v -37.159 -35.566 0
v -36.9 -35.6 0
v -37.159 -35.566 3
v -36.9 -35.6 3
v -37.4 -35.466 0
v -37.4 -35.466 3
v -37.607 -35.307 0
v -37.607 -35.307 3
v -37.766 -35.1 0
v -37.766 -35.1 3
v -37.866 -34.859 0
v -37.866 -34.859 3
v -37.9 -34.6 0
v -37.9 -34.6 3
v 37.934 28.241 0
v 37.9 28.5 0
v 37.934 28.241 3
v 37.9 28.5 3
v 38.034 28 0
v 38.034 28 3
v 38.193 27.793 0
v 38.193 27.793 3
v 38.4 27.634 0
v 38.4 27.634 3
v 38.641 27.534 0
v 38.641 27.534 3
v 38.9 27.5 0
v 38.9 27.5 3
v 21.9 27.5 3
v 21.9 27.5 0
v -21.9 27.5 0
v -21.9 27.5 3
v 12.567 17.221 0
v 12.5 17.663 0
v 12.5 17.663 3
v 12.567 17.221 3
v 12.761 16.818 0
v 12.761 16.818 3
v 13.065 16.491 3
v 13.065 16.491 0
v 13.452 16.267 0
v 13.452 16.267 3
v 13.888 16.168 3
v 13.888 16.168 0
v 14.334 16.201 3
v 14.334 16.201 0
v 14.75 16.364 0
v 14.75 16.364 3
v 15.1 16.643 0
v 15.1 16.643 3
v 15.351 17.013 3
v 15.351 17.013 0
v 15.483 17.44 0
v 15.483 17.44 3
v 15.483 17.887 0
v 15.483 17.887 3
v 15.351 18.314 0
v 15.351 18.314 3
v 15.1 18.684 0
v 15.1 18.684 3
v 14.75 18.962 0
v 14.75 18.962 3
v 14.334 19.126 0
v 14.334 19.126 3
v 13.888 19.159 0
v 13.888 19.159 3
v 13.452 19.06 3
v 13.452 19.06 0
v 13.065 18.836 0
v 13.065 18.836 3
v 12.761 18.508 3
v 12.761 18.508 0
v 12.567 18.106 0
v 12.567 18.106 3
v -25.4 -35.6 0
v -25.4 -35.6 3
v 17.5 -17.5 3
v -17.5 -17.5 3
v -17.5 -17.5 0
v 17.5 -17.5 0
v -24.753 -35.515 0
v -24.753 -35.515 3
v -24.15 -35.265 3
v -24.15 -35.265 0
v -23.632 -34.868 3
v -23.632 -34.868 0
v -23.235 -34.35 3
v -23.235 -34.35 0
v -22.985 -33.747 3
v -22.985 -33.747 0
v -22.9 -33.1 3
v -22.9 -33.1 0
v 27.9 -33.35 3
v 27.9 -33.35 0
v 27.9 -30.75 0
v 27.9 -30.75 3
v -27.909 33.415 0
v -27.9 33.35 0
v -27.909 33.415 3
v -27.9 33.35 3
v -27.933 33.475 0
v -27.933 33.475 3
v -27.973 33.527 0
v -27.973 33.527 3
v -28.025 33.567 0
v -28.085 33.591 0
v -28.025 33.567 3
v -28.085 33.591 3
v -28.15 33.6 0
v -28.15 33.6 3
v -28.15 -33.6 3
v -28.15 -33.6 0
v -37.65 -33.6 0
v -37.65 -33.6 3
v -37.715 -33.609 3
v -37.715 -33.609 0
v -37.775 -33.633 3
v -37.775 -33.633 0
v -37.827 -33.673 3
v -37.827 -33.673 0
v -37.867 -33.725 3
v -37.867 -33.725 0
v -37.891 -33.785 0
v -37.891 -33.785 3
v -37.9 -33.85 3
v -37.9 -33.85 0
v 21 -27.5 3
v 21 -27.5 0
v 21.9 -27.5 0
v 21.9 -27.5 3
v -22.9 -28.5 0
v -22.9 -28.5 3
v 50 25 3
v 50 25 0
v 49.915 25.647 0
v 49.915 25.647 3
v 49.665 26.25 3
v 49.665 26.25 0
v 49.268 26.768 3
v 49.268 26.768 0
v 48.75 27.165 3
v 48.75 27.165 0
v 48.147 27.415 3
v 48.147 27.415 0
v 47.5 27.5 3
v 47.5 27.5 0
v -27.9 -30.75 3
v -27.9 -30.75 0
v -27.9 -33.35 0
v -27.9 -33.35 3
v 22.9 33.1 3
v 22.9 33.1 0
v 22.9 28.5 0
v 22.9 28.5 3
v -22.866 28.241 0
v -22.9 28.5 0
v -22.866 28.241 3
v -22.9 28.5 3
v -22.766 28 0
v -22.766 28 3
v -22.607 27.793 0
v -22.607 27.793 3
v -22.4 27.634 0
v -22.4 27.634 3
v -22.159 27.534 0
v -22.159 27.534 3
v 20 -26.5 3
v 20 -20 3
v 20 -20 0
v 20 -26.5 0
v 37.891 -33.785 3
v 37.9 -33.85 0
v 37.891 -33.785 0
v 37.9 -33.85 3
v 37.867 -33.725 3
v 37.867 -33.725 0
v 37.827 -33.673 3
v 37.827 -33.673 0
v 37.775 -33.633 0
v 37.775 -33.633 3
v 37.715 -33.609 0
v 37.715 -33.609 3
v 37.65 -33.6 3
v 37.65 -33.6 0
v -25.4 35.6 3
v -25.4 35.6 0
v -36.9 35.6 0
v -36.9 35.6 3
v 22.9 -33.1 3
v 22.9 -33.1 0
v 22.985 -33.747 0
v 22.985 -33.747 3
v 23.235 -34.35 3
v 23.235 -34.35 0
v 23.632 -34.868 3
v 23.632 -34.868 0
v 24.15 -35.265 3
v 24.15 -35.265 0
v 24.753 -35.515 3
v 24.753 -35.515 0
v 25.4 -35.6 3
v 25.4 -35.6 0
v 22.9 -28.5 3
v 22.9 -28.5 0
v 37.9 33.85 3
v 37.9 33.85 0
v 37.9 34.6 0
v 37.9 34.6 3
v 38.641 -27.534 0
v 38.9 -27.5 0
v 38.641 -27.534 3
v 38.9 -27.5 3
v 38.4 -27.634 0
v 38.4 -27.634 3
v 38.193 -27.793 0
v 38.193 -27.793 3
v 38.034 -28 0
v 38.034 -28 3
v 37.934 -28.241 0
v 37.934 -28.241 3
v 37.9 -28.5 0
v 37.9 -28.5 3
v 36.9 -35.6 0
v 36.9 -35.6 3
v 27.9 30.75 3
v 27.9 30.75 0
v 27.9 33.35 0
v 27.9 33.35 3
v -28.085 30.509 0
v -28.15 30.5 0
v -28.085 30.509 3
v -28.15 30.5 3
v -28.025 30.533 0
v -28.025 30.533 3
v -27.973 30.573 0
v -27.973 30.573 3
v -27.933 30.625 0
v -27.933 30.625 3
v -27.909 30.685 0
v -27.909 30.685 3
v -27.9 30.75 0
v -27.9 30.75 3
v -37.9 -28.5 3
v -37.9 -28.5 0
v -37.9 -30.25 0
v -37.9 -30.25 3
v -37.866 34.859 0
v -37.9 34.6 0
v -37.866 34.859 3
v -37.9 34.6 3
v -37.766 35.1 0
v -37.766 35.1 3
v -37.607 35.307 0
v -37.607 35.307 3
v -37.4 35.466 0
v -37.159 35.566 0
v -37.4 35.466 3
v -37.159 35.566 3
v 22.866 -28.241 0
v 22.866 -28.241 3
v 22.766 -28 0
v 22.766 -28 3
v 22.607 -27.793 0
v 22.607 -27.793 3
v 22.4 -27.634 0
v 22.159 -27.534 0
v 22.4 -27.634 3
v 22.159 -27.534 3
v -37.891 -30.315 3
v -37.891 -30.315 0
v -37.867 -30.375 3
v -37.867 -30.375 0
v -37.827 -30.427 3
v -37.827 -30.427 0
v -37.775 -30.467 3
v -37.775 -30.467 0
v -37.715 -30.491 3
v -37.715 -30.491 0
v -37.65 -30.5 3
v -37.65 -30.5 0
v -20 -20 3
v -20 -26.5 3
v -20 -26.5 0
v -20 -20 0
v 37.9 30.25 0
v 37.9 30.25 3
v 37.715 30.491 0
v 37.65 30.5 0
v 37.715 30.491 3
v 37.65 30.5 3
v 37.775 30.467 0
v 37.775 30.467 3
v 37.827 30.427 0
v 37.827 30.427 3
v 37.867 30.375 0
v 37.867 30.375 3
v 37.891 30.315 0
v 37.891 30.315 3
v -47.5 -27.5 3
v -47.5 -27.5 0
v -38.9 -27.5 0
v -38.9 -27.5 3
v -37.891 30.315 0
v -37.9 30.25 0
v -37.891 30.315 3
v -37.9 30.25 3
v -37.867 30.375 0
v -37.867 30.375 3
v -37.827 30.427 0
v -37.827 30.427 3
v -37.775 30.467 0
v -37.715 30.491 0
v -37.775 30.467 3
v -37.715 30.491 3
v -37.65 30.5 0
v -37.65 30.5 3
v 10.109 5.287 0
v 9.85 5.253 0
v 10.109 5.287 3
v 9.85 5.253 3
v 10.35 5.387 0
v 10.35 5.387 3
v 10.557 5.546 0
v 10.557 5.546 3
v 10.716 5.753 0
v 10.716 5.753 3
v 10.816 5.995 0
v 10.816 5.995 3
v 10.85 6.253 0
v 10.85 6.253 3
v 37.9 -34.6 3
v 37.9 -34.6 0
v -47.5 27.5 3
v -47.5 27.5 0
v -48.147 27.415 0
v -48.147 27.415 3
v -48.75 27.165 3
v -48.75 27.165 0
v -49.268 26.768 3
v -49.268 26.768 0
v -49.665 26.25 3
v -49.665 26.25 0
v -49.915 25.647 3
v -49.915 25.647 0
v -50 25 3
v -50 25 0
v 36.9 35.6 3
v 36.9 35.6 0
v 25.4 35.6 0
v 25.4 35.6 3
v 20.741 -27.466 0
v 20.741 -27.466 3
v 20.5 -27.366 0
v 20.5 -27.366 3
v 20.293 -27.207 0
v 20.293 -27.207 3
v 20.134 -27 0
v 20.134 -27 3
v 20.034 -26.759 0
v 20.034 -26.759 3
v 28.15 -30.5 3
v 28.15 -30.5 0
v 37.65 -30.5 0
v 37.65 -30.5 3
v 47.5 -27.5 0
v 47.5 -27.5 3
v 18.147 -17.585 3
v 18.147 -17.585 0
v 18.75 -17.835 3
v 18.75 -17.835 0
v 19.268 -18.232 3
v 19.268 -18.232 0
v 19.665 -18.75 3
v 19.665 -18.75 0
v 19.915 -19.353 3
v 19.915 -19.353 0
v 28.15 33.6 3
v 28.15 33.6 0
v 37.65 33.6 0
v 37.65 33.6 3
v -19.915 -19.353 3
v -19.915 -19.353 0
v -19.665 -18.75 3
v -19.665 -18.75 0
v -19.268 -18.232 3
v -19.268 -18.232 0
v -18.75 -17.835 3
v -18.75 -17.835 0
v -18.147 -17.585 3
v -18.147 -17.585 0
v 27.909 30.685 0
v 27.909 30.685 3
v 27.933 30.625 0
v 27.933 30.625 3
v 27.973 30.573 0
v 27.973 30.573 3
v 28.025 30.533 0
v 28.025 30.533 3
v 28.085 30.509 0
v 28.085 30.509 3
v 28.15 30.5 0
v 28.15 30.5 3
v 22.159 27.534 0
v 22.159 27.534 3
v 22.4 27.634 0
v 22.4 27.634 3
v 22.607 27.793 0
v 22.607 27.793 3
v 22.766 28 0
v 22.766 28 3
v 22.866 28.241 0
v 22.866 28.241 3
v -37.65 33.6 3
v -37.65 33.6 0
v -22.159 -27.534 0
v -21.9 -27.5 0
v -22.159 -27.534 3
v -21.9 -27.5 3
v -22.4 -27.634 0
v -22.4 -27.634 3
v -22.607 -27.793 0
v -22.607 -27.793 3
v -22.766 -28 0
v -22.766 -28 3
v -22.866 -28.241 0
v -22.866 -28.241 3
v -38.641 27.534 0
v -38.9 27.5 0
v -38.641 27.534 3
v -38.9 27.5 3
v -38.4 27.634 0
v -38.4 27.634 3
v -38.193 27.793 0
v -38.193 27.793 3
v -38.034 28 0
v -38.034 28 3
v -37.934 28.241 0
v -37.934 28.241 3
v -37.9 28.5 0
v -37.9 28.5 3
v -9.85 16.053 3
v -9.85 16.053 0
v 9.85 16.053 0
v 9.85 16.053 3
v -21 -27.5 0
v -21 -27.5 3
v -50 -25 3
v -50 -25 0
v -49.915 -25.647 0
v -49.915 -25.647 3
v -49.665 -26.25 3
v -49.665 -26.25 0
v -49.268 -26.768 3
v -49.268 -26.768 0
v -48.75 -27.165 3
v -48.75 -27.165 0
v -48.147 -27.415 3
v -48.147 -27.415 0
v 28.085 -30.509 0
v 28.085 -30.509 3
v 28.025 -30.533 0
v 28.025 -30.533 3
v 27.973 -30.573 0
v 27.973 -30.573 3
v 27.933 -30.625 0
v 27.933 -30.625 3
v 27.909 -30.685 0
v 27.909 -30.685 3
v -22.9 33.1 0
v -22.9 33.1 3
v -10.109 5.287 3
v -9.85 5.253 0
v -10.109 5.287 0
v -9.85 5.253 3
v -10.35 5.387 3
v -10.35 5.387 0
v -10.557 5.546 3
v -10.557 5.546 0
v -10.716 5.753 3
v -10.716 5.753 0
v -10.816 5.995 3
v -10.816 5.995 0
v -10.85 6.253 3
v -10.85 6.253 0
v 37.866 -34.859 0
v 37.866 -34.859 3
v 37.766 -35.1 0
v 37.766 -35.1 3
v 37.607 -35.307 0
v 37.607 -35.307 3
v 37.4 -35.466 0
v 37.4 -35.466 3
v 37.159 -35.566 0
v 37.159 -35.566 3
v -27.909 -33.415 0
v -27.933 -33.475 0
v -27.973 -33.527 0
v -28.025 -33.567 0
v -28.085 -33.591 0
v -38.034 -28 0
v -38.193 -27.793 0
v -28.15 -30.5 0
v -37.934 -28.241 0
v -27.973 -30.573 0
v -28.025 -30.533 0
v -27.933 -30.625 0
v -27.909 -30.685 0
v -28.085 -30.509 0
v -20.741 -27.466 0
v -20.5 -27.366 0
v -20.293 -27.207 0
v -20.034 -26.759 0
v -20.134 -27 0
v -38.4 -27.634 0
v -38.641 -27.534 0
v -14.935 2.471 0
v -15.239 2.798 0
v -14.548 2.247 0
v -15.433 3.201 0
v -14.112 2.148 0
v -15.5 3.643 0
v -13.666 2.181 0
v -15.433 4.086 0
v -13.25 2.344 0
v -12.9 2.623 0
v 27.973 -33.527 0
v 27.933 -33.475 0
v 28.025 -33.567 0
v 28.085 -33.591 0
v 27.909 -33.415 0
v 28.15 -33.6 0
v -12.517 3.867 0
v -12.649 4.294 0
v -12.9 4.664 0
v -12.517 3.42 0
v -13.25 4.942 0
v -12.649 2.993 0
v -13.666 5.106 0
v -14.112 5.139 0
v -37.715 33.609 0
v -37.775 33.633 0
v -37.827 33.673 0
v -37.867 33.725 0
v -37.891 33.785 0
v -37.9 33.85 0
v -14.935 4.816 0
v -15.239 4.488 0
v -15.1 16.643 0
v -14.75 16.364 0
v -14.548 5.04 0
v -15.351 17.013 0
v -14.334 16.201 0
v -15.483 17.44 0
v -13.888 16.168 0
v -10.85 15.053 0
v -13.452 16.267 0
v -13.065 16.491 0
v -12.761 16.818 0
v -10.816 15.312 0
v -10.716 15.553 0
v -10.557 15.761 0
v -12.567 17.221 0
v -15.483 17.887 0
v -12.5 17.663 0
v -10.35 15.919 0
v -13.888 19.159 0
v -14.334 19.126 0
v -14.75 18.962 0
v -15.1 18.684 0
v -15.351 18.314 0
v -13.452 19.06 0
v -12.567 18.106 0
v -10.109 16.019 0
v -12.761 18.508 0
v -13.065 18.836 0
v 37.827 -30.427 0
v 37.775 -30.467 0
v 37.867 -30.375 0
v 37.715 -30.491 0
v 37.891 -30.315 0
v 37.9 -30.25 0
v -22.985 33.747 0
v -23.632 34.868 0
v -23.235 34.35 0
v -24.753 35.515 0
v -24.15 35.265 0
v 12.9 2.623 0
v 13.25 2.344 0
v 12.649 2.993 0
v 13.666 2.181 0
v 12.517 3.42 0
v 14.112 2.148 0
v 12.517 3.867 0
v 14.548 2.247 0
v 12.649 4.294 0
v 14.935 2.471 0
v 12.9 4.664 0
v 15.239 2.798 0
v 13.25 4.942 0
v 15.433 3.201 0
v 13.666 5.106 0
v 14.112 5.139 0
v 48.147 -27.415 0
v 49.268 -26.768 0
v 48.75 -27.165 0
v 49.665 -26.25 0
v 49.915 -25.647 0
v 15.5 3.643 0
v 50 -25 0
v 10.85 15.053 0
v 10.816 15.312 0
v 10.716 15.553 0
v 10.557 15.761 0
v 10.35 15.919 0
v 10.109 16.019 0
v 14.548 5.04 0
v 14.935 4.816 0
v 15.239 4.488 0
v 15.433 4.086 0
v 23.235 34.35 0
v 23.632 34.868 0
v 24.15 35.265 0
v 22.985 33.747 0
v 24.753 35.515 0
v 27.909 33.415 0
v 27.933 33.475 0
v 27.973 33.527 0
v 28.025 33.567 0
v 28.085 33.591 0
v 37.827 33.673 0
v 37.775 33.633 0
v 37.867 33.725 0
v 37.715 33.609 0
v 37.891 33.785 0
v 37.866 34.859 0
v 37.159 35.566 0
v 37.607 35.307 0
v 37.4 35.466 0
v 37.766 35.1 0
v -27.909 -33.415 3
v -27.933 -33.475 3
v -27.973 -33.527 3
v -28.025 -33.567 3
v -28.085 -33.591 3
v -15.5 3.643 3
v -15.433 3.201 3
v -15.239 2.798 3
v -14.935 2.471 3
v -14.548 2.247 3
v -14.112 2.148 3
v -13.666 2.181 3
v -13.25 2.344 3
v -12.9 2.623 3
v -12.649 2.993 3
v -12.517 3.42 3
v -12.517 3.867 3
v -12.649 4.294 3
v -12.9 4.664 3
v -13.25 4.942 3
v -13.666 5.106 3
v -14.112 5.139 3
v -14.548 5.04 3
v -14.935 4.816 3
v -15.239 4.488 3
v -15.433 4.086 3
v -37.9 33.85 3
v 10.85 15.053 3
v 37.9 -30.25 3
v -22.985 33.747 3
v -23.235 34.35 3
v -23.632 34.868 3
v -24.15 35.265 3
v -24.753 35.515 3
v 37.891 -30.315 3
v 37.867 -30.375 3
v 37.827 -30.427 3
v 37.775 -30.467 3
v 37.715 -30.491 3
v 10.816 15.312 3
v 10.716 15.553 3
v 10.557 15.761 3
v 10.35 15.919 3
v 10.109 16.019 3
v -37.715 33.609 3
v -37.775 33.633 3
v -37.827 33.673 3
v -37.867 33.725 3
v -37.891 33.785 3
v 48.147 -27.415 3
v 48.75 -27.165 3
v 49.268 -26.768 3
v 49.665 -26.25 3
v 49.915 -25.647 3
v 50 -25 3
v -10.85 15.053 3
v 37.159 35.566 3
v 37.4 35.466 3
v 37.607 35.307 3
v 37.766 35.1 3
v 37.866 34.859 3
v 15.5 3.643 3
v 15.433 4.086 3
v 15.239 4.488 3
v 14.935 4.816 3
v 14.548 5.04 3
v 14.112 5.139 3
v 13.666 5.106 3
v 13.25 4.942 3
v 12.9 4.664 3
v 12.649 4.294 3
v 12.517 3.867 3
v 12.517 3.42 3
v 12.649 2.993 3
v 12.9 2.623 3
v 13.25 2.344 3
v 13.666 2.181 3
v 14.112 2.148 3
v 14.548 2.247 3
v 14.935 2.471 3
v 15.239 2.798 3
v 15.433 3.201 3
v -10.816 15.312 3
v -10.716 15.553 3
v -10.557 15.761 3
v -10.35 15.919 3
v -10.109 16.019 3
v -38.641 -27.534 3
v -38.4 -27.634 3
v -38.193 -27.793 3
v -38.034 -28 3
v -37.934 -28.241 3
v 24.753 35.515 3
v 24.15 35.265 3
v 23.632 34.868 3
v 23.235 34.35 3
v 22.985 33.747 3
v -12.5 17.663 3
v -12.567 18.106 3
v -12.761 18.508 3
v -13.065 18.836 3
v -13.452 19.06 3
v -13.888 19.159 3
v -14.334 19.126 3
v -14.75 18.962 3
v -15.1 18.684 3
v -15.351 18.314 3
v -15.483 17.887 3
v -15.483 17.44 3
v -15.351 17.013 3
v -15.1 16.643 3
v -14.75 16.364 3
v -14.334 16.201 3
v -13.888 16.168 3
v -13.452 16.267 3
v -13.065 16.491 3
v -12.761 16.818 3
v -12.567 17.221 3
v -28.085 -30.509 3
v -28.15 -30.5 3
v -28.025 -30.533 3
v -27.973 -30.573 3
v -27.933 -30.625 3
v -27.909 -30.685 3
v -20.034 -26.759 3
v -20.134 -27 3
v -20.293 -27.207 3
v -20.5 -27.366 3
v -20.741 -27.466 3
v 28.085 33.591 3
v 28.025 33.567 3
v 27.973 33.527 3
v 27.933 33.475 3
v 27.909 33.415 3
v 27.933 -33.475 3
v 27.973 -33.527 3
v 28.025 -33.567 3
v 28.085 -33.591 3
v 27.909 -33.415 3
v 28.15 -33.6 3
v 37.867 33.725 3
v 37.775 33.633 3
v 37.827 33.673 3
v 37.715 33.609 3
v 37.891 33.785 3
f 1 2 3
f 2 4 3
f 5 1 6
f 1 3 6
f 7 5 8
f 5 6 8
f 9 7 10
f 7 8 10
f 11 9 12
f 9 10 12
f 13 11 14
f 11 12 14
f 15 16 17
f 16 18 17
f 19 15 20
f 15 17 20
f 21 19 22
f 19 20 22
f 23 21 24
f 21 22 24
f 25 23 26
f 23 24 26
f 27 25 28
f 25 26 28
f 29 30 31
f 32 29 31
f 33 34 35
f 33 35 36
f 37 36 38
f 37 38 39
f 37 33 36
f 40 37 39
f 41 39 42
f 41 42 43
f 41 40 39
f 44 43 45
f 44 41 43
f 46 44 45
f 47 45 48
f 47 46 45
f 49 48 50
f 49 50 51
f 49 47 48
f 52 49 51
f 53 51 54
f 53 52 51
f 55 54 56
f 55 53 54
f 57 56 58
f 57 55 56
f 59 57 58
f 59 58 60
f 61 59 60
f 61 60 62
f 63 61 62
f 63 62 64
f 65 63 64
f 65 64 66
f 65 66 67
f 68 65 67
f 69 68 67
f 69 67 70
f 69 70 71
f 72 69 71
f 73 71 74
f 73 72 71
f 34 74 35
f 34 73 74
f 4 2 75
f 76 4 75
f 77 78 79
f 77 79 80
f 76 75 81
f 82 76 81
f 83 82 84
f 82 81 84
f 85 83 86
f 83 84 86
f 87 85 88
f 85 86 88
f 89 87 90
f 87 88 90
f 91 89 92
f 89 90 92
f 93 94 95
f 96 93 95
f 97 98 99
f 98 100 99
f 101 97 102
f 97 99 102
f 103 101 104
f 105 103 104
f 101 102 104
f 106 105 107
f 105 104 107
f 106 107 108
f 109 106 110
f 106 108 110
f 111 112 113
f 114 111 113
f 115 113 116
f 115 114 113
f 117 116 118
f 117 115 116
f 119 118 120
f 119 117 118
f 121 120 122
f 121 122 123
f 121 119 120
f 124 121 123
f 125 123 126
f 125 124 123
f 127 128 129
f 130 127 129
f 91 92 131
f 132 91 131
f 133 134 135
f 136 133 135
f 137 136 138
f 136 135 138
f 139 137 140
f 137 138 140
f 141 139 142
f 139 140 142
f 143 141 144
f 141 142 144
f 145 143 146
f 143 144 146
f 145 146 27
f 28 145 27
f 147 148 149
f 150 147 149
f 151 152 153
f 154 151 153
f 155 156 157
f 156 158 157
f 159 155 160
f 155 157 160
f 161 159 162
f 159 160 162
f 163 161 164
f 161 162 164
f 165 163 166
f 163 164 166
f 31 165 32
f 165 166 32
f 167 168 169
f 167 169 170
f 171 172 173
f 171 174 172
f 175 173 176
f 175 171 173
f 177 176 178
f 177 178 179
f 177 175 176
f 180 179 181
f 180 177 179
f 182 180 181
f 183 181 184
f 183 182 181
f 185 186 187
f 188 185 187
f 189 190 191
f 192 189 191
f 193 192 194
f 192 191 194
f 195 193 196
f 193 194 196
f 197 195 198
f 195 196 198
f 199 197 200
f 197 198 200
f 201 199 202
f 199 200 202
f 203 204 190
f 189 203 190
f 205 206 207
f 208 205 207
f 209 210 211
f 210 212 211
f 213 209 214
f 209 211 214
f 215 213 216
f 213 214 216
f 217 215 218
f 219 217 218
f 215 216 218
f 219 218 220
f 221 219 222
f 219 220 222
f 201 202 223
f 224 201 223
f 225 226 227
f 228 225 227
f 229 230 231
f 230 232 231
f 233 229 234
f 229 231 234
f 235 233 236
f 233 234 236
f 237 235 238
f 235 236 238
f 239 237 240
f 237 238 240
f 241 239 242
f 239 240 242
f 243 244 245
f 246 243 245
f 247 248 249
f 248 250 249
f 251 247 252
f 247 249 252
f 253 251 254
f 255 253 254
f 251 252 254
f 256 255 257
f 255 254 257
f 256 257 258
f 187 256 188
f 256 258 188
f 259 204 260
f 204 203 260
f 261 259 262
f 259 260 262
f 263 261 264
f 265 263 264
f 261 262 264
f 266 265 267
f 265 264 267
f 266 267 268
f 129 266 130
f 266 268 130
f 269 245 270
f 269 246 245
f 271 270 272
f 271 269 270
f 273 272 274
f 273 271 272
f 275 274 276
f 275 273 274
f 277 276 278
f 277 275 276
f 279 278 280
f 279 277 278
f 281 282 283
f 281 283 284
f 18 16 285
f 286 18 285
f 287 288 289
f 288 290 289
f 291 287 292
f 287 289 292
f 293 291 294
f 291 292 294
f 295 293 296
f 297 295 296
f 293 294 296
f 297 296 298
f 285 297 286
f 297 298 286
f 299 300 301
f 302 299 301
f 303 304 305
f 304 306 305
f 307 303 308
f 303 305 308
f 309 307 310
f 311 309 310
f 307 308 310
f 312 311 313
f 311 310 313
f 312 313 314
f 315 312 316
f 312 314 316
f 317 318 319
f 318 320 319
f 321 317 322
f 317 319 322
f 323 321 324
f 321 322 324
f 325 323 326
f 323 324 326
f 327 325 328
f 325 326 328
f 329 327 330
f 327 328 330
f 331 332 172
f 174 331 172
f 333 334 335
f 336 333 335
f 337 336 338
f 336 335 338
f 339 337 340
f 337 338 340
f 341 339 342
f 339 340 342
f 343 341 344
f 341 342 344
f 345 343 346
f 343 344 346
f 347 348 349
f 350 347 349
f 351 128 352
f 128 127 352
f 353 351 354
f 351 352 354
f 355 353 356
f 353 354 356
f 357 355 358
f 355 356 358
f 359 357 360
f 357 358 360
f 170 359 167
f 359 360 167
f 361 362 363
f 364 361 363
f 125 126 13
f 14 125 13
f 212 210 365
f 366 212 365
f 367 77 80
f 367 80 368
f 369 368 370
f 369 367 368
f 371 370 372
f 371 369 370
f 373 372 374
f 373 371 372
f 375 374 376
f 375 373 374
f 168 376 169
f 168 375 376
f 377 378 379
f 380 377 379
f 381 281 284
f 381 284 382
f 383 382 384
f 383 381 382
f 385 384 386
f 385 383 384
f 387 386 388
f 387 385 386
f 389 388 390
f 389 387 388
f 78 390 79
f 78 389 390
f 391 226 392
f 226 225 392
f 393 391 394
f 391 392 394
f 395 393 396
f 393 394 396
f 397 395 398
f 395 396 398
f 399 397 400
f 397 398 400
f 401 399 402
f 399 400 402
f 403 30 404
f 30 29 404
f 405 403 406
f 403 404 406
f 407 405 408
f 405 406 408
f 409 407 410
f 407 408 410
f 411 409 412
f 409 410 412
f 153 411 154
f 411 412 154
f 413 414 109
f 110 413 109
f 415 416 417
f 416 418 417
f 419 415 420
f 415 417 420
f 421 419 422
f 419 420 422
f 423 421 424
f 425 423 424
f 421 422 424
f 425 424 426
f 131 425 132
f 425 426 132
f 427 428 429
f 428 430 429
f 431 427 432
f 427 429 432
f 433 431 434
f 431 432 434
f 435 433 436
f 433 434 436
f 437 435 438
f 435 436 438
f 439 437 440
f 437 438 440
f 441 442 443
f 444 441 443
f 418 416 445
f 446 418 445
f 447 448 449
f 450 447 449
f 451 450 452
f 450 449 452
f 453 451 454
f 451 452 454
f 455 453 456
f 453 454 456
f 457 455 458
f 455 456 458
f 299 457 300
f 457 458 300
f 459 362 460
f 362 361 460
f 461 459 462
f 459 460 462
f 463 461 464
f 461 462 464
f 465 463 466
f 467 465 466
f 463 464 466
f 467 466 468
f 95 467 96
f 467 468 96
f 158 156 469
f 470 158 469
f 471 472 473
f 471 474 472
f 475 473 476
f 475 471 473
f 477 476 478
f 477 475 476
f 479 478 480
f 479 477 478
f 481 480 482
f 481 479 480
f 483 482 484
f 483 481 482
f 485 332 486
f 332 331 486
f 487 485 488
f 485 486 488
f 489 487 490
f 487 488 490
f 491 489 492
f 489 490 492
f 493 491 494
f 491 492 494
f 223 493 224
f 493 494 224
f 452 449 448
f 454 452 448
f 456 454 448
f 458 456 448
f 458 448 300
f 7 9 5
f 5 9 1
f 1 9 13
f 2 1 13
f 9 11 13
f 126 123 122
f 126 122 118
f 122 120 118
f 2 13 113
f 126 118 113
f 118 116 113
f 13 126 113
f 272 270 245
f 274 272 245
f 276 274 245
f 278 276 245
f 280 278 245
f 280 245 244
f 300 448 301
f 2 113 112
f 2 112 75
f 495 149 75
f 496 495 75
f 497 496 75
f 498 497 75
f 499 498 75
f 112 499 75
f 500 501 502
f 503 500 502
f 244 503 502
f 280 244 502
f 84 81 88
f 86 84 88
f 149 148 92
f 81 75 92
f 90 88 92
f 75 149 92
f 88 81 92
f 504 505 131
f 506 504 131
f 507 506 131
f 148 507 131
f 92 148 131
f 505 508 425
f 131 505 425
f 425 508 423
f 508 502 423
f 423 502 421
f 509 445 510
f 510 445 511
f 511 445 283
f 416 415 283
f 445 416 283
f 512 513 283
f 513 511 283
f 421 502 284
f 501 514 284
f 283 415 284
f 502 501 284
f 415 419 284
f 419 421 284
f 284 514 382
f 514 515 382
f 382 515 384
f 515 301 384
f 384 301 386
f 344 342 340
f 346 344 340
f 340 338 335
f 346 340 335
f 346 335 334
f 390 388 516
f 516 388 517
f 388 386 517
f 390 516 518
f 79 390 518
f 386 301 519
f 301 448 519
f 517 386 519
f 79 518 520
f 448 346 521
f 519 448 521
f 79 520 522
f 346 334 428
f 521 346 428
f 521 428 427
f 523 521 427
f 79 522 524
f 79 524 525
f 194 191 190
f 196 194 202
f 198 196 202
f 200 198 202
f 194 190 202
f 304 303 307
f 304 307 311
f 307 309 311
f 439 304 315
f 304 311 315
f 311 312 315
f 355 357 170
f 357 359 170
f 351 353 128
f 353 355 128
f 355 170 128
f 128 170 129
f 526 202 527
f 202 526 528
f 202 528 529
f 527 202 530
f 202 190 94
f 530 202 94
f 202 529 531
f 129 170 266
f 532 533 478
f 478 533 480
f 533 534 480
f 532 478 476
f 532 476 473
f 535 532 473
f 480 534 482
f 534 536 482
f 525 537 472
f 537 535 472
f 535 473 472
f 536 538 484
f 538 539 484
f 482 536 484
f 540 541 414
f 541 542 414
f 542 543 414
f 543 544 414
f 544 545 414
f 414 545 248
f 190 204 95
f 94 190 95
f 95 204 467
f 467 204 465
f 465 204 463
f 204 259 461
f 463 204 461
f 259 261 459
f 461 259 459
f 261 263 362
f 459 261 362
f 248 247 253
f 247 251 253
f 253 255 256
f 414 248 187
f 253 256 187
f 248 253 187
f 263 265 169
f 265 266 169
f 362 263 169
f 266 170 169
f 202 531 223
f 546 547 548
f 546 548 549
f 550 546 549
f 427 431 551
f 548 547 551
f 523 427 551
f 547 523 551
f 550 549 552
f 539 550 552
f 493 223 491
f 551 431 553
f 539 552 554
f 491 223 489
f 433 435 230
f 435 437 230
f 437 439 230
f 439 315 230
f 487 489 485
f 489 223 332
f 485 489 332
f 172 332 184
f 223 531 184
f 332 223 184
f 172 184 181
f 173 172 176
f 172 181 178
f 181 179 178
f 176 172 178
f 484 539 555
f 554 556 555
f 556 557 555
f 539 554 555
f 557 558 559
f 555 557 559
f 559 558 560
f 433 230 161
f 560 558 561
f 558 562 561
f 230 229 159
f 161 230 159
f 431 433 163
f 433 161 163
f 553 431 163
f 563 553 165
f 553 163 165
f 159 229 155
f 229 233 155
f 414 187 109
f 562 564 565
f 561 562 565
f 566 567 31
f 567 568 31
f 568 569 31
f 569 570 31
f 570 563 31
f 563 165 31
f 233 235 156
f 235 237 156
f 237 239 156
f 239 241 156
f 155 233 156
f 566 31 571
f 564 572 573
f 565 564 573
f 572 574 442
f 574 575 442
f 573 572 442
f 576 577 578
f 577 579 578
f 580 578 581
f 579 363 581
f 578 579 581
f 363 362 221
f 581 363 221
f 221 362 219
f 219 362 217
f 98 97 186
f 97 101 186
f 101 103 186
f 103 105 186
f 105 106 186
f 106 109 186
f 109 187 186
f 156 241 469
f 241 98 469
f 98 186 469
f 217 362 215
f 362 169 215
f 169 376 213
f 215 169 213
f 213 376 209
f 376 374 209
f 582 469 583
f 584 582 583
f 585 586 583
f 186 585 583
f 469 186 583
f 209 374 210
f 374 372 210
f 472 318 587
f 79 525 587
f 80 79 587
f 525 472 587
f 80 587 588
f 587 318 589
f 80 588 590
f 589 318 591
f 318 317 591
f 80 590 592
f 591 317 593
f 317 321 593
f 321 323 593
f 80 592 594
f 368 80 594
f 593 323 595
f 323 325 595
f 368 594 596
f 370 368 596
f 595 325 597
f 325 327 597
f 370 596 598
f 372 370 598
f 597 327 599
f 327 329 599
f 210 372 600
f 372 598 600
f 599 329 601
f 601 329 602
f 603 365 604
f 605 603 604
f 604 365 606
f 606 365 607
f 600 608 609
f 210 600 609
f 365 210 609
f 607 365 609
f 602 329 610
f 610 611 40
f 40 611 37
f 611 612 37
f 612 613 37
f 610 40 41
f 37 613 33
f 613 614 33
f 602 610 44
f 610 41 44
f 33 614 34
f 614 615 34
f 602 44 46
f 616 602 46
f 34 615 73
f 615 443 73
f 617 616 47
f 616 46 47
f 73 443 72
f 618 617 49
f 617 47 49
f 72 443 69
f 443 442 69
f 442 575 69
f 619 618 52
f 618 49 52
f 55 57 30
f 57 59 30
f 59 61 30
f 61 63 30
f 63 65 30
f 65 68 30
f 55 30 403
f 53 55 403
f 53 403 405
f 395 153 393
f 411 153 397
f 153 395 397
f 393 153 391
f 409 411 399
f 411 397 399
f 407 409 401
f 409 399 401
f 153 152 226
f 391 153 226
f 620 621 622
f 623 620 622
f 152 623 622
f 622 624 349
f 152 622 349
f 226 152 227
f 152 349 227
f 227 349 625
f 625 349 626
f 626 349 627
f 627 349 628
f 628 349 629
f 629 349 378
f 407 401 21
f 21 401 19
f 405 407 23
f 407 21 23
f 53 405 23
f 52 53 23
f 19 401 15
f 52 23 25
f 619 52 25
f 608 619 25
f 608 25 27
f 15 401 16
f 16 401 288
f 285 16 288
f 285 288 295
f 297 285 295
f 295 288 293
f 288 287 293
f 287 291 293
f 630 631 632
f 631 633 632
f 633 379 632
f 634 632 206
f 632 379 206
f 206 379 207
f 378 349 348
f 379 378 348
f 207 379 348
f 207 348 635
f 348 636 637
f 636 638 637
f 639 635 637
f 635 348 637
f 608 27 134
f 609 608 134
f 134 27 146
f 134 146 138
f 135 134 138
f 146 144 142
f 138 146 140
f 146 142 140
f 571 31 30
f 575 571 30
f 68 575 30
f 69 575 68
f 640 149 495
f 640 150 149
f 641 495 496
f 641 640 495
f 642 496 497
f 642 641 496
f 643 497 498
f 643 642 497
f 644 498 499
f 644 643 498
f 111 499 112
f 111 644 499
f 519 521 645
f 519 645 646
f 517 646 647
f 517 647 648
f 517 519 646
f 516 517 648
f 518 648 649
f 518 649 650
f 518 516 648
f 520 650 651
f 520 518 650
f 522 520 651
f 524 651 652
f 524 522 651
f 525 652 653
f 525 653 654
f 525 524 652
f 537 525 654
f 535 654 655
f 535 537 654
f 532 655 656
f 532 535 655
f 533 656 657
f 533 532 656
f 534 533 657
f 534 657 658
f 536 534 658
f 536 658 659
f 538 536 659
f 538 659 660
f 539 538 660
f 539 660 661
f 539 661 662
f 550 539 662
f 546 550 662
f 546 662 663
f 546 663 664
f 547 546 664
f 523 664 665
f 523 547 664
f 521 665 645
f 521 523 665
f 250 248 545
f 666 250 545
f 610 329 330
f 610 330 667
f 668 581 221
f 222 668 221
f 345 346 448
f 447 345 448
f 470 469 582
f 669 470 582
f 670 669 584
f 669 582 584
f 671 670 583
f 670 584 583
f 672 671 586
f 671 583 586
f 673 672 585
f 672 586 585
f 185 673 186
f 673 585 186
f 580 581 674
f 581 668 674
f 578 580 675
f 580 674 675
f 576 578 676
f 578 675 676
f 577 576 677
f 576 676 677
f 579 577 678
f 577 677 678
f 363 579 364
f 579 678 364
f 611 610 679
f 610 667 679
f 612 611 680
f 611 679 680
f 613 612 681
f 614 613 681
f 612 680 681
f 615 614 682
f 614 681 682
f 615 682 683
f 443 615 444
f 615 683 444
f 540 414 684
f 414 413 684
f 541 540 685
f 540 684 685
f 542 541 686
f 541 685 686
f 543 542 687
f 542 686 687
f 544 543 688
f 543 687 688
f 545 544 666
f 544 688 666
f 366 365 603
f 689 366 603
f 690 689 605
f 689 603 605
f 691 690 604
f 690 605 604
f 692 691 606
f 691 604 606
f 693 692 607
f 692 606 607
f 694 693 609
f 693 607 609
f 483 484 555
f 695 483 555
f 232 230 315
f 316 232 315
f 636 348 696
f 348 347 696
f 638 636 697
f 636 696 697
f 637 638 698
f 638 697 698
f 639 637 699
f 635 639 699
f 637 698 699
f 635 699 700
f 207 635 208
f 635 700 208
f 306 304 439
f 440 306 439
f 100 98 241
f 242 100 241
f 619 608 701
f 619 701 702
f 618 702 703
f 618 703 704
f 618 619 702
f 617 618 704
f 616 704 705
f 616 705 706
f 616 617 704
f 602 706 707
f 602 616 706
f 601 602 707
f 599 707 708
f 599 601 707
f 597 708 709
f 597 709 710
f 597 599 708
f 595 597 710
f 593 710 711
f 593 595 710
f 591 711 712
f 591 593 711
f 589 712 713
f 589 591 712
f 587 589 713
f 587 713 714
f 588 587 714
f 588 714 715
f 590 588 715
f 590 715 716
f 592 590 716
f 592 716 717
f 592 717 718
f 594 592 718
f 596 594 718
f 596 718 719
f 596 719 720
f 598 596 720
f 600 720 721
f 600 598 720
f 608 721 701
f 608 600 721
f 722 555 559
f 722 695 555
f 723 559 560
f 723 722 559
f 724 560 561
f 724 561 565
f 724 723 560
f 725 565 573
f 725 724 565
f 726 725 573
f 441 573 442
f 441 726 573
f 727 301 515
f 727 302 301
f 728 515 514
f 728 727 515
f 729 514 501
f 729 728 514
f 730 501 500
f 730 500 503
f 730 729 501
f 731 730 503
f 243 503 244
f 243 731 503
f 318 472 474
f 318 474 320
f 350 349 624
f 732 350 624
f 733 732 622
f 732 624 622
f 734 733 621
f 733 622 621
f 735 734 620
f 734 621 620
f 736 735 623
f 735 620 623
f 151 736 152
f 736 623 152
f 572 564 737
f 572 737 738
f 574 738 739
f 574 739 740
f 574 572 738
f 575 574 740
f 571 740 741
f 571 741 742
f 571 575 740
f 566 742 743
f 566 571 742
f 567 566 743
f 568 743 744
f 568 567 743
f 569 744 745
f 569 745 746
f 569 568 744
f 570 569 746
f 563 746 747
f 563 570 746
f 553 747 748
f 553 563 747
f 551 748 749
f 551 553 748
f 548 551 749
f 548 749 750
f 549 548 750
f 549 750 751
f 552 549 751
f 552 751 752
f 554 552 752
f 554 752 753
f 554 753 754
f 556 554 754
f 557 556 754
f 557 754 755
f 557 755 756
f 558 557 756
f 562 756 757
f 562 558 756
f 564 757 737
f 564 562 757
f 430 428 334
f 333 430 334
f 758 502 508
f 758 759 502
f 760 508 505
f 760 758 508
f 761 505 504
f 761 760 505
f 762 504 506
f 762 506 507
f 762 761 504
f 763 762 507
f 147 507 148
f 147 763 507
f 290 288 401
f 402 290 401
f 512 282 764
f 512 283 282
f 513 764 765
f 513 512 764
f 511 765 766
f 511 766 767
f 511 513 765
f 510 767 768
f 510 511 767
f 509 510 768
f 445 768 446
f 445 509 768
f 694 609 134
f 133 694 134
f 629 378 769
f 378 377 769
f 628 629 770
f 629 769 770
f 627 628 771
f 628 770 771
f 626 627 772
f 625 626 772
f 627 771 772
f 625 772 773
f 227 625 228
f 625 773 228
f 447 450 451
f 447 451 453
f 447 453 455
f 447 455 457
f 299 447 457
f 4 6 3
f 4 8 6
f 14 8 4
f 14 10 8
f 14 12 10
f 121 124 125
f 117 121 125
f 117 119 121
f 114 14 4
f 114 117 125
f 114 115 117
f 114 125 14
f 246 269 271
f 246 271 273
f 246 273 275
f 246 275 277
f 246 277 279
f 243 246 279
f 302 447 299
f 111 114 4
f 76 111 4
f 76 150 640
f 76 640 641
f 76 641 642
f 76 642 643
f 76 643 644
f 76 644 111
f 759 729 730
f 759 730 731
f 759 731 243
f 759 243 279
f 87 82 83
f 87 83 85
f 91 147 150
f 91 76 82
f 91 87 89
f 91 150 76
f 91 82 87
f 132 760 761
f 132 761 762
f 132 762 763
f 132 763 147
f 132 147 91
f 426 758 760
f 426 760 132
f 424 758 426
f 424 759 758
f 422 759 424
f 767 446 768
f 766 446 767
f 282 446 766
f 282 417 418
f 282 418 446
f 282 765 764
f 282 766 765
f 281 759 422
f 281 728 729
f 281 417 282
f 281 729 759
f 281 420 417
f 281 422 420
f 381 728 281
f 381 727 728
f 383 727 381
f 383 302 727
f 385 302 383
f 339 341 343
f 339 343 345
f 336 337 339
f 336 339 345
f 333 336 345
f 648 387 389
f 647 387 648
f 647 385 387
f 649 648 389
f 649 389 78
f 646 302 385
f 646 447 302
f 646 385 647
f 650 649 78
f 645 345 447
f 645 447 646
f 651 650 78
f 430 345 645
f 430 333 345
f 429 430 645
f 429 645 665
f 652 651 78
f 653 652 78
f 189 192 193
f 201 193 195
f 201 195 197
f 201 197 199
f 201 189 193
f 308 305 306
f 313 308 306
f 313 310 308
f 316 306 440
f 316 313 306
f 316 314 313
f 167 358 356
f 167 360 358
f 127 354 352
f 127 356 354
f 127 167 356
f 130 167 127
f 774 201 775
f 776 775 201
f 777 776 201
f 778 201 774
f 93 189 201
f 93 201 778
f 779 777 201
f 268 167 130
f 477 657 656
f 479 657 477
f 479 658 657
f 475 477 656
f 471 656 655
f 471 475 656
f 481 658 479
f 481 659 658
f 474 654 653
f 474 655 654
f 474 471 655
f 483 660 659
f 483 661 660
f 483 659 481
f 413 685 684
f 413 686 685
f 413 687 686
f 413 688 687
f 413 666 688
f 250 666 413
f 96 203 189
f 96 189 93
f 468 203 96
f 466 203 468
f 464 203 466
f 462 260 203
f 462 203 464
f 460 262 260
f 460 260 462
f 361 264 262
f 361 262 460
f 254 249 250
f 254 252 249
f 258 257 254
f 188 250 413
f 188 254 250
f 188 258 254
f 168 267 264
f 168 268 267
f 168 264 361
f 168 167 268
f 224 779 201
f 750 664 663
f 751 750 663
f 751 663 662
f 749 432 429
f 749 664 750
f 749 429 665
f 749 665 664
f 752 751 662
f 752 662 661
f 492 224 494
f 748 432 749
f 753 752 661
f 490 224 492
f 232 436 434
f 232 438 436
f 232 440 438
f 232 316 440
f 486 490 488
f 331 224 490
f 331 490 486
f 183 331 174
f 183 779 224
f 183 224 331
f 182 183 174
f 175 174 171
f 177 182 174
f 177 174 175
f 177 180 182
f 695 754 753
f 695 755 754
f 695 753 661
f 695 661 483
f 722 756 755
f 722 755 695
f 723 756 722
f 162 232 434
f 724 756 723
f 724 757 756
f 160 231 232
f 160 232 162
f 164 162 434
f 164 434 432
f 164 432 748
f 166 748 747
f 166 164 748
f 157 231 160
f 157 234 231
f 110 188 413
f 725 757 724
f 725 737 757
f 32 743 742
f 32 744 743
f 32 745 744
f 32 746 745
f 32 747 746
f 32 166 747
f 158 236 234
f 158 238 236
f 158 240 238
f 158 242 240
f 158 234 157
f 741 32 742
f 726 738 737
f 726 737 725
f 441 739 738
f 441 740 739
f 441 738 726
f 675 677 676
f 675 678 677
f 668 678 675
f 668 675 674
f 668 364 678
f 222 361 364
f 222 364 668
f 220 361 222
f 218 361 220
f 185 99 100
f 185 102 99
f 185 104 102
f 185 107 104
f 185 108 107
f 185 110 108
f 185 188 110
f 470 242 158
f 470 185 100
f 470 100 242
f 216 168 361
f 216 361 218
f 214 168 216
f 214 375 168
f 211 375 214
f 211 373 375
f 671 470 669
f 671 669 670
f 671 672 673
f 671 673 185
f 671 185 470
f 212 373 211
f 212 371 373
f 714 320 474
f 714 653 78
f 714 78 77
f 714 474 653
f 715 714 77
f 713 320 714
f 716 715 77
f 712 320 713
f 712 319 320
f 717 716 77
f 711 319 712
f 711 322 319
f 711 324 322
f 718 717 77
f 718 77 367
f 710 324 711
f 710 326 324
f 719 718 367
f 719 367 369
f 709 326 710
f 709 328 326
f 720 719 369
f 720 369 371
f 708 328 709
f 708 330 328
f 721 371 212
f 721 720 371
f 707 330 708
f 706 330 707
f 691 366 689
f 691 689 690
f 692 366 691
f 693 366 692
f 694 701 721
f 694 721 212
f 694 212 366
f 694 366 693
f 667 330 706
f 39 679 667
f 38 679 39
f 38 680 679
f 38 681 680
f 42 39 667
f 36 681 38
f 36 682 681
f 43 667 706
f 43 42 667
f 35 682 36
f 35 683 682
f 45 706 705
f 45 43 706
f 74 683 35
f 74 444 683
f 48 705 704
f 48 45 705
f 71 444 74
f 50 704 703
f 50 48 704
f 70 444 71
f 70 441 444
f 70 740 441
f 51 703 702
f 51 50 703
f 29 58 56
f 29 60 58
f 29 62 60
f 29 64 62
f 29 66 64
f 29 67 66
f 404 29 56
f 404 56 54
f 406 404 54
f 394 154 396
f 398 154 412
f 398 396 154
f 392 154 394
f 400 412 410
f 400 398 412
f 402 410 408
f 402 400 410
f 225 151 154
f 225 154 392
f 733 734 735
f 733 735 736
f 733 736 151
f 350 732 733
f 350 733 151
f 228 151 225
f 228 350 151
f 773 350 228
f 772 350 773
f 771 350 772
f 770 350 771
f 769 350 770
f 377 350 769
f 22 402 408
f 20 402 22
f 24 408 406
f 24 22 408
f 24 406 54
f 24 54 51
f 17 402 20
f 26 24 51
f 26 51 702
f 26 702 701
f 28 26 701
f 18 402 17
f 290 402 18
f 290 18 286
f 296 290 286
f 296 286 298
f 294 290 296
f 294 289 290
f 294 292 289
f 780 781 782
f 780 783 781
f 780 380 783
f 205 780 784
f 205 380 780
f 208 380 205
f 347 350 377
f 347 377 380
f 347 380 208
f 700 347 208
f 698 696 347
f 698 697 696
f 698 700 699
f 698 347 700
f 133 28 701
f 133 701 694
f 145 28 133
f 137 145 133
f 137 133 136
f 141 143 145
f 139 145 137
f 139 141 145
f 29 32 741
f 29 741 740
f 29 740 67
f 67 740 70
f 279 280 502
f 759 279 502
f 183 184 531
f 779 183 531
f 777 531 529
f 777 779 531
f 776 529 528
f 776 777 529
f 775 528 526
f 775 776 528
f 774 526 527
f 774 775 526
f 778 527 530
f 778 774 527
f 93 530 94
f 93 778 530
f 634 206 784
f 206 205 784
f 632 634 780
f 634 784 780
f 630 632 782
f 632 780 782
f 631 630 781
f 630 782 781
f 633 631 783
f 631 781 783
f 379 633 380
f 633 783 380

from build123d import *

# Parameters (mm, degrees)
CROQUIS1_R              = 1.5
CROQUIS1_W              = 21.7
CROQUIS1_H              = 10.8
SALIENTE_EXTRUIR1_DEPTH = 3
CORTAR_EXTRUIR2_DEPTH   = 3
REDONDEO1_R             = 1
REDONDEO2_R             = 0.25


with BuildPart() as part:
    # Croquis1 → Saliente-Extruir1 (new body)
    with BuildSketch(Plane.XY):
        with BuildLine():
            Line((-50, 25), (-50, -25))
            ThreePointArc((-50, -25), (-49.267766953, -26.767766953), (-47.5, -27.5))
            Line((-47.5, -27.5), (-37.9, -27.5))
            Line((-37.9, -27.5), (-37.9, -30.5))
            Line((-37.9, -30.5), (-27.9, -30.5))
            Line((-27.9, -30.5), (-27.9, -33.6))
            Line((-27.9, -33.6), (-37.9, -33.6))
            Line((-37.9, -33.6), (-37.9, -35.6))
            Line((-37.9, -35.6), (-25.4, -35.6))
            ThreePointArc((-25.4, -35.6), (-23.632233047, -34.867766953), (-22.9, -33.1))
            Line((-22.9, -33.1), (-22.9, -27.5))
            Line((-22.9, -27.5), (22.9, -27.5))
            Line((22.9, -27.5), (22.9, -33.1))
            ThreePointArc((22.9, -33.1), (23.632233047, -34.867766953), (25.4, -35.6))
            Line((25.4, -35.6), (37.9, -35.6))
            Line((37.9, -35.6), (37.9, -33.6))
            Line((37.9, -33.6), (27.9, -33.6))
            Line((27.9, -33.6), (27.9, -30.5))
            Line((27.9, -30.5), (37.9, -30.5))
            Line((37.9, -30.5), (37.9, -27.5))
            Line((37.9, -27.5), (47.5, -27.5))
            ThreePointArc((47.5, -27.5), (49.267766953, -26.767766953), (50, -25))
            Line((50, -25), (50, 25))
            ThreePointArc((50, 25), (49.267766953, 26.767766953), (47.5, 27.5))
            Line((47.5, 27.5), (37.9, 27.5))
            Line((37.9, 27.5), (37.9, 30.5))
            Line((37.9, 30.5), (27.9, 30.5))
            Line((27.9, 30.5), (27.9, 33.6))
            Line((27.9, 33.6), (37.9, 33.6))
            Line((37.9, 33.6), (37.9, 35.6))
            Line((37.9, 35.6), (25.4, 35.6))
            ThreePointArc((25.4, 35.6), (23.632233047, 34.867766953), (22.9, 33.1))
            Line((22.9, 33.1), (22.9, 27.5))
            Line((22.9, 27.5), (-22.9, 27.5))
            Line((-22.9, 27.5), (-22.9, 33.1))
            ThreePointArc((-22.9, 33.1), (-23.632233047, 34.867766953), (-25.4, 35.6))
            Line((-25.4, 35.6), (-37.9, 35.6))
            Line((-37.9, 35.6), (-37.9, 33.6))
            Line((-37.9, 33.6), (-27.9, 33.6))
            Line((-27.9, 33.6), (-27.9, 30.5))
            Line((-27.9, 30.5), (-37.9, 30.5))
            Line((-37.9, 30.5), (-37.9, 27.5))
            Line((-37.9, 27.5), (-47.5, 27.5))
            ThreePointArc((-47.5, 27.5), (-49.267766953, 26.767766953), (-50, 25))
        make_face()
        with Locations((-14, 17.663397979)):
            Circle(CROQUIS1_R, mode=Mode.SUBTRACT)
        with Locations(Location((14, 17.663397979, 0), (0, 0, 180))):
            Circle(CROQUIS1_R, mode=Mode.SUBTRACT)
        with Locations((14, 3.643397979)):
            Circle(CROQUIS1_R, mode=Mode.SUBTRACT)
        with Locations(Location((-14, 3.643397979, 0), (0, 0, 180))):
            Circle(CROQUIS1_R, mode=Mode.SUBTRACT)
        with Locations((0, 10.653397979)):
            Rectangle(CROQUIS1_W, CROQUIS1_H, mode=Mode.SUBTRACT)
    extrude(amount=SALIENTE_EXTRUIR1_DEPTH)

    # Croquis2 → Cortar-Extruir2 (cut, symmetric)
    with BuildSketch(Plane.XY):
        with BuildLine():
            Line((-17.5, -17.5), (17.5, -17.5))
            ThreePointArc((17.5, -17.5), (19.267766953, -18.232233047), (20, -20))
            Line((20, -20), (20, -37.5))
            Line((20, -37.5), (-20, -37.5))
            Line((-20, -37.5), (-20, -20))
            ThreePointArc((-20, -20), (-19.267766953, -18.232233047), (-17.5, -17.5))
        make_face()
    extrude(amount=CORTAR_EXTRUIR2_DEPTH, both=True, mode=Mode.SUBTRACT)

    # Redondeo1
    redondeo1_edges = [part.edges().sort_by_distance(p)[0] for p in [
        (10.85, 5.253397979, 1.5),
        (10.85, 16.053397979, 1.5),
        (-10.85, 16.053397979, 1.5),
        (-10.85, 5.253397979, 1.5),
        (20, -27.5, 1.5),
        (-20, -27.5, 1.5),
        (-37.9, 27.5, 1.5),
        (-37.9, 35.6, 1.5),
        (-22.9, 27.5, 1.5),
        (22.9, 27.5, 1.5),
        (37.9, 35.6, 1.5),
        (37.9, 27.5, 1.5),
        (37.9, -27.5, 1.5),
        (37.9, -35.6, 1.5),
        (22.9, -27.5, 1.5),
        (-22.9, -27.5, 1.5),
        (-37.9, -35.6, 1.5),
        (-37.9, -27.5, 1.5),
    ]]
    fillet(redondeo1_edges, radius=REDONDEO1_R)

    # Redondeo2
    redondeo2_edges = [part.edges().sort_by_distance(p)[0] for p in [
        (-37.9, 30.5, 1.5),
        (-27.9, 30.5, 1.5),
        (-27.9, 33.6, 1.5),
        (-37.9, 33.6, 1.5),
        (37.9, 33.6, 1.5),
        (27.9, 33.6, 1.5),
        (27.9, 30.5, 1.5),
        (37.9, 30.5, 1.5),
        (37.9, -30.5, 1.5),
        (27.9, -30.5, 1.5),
        (27.9, -33.6, 1.5),
        (37.9, -33.6, 1.5),
        (-37.9, -33.6, 1.5),
        (-27.9, -33.6, 1.5),
        (-27.9, -30.5, 1.5),
        (-37.9, -30.5, 1.5),
    ]]
    fillet(redondeo2_edges, radius=REDONDEO2_R)


solid = part.part
